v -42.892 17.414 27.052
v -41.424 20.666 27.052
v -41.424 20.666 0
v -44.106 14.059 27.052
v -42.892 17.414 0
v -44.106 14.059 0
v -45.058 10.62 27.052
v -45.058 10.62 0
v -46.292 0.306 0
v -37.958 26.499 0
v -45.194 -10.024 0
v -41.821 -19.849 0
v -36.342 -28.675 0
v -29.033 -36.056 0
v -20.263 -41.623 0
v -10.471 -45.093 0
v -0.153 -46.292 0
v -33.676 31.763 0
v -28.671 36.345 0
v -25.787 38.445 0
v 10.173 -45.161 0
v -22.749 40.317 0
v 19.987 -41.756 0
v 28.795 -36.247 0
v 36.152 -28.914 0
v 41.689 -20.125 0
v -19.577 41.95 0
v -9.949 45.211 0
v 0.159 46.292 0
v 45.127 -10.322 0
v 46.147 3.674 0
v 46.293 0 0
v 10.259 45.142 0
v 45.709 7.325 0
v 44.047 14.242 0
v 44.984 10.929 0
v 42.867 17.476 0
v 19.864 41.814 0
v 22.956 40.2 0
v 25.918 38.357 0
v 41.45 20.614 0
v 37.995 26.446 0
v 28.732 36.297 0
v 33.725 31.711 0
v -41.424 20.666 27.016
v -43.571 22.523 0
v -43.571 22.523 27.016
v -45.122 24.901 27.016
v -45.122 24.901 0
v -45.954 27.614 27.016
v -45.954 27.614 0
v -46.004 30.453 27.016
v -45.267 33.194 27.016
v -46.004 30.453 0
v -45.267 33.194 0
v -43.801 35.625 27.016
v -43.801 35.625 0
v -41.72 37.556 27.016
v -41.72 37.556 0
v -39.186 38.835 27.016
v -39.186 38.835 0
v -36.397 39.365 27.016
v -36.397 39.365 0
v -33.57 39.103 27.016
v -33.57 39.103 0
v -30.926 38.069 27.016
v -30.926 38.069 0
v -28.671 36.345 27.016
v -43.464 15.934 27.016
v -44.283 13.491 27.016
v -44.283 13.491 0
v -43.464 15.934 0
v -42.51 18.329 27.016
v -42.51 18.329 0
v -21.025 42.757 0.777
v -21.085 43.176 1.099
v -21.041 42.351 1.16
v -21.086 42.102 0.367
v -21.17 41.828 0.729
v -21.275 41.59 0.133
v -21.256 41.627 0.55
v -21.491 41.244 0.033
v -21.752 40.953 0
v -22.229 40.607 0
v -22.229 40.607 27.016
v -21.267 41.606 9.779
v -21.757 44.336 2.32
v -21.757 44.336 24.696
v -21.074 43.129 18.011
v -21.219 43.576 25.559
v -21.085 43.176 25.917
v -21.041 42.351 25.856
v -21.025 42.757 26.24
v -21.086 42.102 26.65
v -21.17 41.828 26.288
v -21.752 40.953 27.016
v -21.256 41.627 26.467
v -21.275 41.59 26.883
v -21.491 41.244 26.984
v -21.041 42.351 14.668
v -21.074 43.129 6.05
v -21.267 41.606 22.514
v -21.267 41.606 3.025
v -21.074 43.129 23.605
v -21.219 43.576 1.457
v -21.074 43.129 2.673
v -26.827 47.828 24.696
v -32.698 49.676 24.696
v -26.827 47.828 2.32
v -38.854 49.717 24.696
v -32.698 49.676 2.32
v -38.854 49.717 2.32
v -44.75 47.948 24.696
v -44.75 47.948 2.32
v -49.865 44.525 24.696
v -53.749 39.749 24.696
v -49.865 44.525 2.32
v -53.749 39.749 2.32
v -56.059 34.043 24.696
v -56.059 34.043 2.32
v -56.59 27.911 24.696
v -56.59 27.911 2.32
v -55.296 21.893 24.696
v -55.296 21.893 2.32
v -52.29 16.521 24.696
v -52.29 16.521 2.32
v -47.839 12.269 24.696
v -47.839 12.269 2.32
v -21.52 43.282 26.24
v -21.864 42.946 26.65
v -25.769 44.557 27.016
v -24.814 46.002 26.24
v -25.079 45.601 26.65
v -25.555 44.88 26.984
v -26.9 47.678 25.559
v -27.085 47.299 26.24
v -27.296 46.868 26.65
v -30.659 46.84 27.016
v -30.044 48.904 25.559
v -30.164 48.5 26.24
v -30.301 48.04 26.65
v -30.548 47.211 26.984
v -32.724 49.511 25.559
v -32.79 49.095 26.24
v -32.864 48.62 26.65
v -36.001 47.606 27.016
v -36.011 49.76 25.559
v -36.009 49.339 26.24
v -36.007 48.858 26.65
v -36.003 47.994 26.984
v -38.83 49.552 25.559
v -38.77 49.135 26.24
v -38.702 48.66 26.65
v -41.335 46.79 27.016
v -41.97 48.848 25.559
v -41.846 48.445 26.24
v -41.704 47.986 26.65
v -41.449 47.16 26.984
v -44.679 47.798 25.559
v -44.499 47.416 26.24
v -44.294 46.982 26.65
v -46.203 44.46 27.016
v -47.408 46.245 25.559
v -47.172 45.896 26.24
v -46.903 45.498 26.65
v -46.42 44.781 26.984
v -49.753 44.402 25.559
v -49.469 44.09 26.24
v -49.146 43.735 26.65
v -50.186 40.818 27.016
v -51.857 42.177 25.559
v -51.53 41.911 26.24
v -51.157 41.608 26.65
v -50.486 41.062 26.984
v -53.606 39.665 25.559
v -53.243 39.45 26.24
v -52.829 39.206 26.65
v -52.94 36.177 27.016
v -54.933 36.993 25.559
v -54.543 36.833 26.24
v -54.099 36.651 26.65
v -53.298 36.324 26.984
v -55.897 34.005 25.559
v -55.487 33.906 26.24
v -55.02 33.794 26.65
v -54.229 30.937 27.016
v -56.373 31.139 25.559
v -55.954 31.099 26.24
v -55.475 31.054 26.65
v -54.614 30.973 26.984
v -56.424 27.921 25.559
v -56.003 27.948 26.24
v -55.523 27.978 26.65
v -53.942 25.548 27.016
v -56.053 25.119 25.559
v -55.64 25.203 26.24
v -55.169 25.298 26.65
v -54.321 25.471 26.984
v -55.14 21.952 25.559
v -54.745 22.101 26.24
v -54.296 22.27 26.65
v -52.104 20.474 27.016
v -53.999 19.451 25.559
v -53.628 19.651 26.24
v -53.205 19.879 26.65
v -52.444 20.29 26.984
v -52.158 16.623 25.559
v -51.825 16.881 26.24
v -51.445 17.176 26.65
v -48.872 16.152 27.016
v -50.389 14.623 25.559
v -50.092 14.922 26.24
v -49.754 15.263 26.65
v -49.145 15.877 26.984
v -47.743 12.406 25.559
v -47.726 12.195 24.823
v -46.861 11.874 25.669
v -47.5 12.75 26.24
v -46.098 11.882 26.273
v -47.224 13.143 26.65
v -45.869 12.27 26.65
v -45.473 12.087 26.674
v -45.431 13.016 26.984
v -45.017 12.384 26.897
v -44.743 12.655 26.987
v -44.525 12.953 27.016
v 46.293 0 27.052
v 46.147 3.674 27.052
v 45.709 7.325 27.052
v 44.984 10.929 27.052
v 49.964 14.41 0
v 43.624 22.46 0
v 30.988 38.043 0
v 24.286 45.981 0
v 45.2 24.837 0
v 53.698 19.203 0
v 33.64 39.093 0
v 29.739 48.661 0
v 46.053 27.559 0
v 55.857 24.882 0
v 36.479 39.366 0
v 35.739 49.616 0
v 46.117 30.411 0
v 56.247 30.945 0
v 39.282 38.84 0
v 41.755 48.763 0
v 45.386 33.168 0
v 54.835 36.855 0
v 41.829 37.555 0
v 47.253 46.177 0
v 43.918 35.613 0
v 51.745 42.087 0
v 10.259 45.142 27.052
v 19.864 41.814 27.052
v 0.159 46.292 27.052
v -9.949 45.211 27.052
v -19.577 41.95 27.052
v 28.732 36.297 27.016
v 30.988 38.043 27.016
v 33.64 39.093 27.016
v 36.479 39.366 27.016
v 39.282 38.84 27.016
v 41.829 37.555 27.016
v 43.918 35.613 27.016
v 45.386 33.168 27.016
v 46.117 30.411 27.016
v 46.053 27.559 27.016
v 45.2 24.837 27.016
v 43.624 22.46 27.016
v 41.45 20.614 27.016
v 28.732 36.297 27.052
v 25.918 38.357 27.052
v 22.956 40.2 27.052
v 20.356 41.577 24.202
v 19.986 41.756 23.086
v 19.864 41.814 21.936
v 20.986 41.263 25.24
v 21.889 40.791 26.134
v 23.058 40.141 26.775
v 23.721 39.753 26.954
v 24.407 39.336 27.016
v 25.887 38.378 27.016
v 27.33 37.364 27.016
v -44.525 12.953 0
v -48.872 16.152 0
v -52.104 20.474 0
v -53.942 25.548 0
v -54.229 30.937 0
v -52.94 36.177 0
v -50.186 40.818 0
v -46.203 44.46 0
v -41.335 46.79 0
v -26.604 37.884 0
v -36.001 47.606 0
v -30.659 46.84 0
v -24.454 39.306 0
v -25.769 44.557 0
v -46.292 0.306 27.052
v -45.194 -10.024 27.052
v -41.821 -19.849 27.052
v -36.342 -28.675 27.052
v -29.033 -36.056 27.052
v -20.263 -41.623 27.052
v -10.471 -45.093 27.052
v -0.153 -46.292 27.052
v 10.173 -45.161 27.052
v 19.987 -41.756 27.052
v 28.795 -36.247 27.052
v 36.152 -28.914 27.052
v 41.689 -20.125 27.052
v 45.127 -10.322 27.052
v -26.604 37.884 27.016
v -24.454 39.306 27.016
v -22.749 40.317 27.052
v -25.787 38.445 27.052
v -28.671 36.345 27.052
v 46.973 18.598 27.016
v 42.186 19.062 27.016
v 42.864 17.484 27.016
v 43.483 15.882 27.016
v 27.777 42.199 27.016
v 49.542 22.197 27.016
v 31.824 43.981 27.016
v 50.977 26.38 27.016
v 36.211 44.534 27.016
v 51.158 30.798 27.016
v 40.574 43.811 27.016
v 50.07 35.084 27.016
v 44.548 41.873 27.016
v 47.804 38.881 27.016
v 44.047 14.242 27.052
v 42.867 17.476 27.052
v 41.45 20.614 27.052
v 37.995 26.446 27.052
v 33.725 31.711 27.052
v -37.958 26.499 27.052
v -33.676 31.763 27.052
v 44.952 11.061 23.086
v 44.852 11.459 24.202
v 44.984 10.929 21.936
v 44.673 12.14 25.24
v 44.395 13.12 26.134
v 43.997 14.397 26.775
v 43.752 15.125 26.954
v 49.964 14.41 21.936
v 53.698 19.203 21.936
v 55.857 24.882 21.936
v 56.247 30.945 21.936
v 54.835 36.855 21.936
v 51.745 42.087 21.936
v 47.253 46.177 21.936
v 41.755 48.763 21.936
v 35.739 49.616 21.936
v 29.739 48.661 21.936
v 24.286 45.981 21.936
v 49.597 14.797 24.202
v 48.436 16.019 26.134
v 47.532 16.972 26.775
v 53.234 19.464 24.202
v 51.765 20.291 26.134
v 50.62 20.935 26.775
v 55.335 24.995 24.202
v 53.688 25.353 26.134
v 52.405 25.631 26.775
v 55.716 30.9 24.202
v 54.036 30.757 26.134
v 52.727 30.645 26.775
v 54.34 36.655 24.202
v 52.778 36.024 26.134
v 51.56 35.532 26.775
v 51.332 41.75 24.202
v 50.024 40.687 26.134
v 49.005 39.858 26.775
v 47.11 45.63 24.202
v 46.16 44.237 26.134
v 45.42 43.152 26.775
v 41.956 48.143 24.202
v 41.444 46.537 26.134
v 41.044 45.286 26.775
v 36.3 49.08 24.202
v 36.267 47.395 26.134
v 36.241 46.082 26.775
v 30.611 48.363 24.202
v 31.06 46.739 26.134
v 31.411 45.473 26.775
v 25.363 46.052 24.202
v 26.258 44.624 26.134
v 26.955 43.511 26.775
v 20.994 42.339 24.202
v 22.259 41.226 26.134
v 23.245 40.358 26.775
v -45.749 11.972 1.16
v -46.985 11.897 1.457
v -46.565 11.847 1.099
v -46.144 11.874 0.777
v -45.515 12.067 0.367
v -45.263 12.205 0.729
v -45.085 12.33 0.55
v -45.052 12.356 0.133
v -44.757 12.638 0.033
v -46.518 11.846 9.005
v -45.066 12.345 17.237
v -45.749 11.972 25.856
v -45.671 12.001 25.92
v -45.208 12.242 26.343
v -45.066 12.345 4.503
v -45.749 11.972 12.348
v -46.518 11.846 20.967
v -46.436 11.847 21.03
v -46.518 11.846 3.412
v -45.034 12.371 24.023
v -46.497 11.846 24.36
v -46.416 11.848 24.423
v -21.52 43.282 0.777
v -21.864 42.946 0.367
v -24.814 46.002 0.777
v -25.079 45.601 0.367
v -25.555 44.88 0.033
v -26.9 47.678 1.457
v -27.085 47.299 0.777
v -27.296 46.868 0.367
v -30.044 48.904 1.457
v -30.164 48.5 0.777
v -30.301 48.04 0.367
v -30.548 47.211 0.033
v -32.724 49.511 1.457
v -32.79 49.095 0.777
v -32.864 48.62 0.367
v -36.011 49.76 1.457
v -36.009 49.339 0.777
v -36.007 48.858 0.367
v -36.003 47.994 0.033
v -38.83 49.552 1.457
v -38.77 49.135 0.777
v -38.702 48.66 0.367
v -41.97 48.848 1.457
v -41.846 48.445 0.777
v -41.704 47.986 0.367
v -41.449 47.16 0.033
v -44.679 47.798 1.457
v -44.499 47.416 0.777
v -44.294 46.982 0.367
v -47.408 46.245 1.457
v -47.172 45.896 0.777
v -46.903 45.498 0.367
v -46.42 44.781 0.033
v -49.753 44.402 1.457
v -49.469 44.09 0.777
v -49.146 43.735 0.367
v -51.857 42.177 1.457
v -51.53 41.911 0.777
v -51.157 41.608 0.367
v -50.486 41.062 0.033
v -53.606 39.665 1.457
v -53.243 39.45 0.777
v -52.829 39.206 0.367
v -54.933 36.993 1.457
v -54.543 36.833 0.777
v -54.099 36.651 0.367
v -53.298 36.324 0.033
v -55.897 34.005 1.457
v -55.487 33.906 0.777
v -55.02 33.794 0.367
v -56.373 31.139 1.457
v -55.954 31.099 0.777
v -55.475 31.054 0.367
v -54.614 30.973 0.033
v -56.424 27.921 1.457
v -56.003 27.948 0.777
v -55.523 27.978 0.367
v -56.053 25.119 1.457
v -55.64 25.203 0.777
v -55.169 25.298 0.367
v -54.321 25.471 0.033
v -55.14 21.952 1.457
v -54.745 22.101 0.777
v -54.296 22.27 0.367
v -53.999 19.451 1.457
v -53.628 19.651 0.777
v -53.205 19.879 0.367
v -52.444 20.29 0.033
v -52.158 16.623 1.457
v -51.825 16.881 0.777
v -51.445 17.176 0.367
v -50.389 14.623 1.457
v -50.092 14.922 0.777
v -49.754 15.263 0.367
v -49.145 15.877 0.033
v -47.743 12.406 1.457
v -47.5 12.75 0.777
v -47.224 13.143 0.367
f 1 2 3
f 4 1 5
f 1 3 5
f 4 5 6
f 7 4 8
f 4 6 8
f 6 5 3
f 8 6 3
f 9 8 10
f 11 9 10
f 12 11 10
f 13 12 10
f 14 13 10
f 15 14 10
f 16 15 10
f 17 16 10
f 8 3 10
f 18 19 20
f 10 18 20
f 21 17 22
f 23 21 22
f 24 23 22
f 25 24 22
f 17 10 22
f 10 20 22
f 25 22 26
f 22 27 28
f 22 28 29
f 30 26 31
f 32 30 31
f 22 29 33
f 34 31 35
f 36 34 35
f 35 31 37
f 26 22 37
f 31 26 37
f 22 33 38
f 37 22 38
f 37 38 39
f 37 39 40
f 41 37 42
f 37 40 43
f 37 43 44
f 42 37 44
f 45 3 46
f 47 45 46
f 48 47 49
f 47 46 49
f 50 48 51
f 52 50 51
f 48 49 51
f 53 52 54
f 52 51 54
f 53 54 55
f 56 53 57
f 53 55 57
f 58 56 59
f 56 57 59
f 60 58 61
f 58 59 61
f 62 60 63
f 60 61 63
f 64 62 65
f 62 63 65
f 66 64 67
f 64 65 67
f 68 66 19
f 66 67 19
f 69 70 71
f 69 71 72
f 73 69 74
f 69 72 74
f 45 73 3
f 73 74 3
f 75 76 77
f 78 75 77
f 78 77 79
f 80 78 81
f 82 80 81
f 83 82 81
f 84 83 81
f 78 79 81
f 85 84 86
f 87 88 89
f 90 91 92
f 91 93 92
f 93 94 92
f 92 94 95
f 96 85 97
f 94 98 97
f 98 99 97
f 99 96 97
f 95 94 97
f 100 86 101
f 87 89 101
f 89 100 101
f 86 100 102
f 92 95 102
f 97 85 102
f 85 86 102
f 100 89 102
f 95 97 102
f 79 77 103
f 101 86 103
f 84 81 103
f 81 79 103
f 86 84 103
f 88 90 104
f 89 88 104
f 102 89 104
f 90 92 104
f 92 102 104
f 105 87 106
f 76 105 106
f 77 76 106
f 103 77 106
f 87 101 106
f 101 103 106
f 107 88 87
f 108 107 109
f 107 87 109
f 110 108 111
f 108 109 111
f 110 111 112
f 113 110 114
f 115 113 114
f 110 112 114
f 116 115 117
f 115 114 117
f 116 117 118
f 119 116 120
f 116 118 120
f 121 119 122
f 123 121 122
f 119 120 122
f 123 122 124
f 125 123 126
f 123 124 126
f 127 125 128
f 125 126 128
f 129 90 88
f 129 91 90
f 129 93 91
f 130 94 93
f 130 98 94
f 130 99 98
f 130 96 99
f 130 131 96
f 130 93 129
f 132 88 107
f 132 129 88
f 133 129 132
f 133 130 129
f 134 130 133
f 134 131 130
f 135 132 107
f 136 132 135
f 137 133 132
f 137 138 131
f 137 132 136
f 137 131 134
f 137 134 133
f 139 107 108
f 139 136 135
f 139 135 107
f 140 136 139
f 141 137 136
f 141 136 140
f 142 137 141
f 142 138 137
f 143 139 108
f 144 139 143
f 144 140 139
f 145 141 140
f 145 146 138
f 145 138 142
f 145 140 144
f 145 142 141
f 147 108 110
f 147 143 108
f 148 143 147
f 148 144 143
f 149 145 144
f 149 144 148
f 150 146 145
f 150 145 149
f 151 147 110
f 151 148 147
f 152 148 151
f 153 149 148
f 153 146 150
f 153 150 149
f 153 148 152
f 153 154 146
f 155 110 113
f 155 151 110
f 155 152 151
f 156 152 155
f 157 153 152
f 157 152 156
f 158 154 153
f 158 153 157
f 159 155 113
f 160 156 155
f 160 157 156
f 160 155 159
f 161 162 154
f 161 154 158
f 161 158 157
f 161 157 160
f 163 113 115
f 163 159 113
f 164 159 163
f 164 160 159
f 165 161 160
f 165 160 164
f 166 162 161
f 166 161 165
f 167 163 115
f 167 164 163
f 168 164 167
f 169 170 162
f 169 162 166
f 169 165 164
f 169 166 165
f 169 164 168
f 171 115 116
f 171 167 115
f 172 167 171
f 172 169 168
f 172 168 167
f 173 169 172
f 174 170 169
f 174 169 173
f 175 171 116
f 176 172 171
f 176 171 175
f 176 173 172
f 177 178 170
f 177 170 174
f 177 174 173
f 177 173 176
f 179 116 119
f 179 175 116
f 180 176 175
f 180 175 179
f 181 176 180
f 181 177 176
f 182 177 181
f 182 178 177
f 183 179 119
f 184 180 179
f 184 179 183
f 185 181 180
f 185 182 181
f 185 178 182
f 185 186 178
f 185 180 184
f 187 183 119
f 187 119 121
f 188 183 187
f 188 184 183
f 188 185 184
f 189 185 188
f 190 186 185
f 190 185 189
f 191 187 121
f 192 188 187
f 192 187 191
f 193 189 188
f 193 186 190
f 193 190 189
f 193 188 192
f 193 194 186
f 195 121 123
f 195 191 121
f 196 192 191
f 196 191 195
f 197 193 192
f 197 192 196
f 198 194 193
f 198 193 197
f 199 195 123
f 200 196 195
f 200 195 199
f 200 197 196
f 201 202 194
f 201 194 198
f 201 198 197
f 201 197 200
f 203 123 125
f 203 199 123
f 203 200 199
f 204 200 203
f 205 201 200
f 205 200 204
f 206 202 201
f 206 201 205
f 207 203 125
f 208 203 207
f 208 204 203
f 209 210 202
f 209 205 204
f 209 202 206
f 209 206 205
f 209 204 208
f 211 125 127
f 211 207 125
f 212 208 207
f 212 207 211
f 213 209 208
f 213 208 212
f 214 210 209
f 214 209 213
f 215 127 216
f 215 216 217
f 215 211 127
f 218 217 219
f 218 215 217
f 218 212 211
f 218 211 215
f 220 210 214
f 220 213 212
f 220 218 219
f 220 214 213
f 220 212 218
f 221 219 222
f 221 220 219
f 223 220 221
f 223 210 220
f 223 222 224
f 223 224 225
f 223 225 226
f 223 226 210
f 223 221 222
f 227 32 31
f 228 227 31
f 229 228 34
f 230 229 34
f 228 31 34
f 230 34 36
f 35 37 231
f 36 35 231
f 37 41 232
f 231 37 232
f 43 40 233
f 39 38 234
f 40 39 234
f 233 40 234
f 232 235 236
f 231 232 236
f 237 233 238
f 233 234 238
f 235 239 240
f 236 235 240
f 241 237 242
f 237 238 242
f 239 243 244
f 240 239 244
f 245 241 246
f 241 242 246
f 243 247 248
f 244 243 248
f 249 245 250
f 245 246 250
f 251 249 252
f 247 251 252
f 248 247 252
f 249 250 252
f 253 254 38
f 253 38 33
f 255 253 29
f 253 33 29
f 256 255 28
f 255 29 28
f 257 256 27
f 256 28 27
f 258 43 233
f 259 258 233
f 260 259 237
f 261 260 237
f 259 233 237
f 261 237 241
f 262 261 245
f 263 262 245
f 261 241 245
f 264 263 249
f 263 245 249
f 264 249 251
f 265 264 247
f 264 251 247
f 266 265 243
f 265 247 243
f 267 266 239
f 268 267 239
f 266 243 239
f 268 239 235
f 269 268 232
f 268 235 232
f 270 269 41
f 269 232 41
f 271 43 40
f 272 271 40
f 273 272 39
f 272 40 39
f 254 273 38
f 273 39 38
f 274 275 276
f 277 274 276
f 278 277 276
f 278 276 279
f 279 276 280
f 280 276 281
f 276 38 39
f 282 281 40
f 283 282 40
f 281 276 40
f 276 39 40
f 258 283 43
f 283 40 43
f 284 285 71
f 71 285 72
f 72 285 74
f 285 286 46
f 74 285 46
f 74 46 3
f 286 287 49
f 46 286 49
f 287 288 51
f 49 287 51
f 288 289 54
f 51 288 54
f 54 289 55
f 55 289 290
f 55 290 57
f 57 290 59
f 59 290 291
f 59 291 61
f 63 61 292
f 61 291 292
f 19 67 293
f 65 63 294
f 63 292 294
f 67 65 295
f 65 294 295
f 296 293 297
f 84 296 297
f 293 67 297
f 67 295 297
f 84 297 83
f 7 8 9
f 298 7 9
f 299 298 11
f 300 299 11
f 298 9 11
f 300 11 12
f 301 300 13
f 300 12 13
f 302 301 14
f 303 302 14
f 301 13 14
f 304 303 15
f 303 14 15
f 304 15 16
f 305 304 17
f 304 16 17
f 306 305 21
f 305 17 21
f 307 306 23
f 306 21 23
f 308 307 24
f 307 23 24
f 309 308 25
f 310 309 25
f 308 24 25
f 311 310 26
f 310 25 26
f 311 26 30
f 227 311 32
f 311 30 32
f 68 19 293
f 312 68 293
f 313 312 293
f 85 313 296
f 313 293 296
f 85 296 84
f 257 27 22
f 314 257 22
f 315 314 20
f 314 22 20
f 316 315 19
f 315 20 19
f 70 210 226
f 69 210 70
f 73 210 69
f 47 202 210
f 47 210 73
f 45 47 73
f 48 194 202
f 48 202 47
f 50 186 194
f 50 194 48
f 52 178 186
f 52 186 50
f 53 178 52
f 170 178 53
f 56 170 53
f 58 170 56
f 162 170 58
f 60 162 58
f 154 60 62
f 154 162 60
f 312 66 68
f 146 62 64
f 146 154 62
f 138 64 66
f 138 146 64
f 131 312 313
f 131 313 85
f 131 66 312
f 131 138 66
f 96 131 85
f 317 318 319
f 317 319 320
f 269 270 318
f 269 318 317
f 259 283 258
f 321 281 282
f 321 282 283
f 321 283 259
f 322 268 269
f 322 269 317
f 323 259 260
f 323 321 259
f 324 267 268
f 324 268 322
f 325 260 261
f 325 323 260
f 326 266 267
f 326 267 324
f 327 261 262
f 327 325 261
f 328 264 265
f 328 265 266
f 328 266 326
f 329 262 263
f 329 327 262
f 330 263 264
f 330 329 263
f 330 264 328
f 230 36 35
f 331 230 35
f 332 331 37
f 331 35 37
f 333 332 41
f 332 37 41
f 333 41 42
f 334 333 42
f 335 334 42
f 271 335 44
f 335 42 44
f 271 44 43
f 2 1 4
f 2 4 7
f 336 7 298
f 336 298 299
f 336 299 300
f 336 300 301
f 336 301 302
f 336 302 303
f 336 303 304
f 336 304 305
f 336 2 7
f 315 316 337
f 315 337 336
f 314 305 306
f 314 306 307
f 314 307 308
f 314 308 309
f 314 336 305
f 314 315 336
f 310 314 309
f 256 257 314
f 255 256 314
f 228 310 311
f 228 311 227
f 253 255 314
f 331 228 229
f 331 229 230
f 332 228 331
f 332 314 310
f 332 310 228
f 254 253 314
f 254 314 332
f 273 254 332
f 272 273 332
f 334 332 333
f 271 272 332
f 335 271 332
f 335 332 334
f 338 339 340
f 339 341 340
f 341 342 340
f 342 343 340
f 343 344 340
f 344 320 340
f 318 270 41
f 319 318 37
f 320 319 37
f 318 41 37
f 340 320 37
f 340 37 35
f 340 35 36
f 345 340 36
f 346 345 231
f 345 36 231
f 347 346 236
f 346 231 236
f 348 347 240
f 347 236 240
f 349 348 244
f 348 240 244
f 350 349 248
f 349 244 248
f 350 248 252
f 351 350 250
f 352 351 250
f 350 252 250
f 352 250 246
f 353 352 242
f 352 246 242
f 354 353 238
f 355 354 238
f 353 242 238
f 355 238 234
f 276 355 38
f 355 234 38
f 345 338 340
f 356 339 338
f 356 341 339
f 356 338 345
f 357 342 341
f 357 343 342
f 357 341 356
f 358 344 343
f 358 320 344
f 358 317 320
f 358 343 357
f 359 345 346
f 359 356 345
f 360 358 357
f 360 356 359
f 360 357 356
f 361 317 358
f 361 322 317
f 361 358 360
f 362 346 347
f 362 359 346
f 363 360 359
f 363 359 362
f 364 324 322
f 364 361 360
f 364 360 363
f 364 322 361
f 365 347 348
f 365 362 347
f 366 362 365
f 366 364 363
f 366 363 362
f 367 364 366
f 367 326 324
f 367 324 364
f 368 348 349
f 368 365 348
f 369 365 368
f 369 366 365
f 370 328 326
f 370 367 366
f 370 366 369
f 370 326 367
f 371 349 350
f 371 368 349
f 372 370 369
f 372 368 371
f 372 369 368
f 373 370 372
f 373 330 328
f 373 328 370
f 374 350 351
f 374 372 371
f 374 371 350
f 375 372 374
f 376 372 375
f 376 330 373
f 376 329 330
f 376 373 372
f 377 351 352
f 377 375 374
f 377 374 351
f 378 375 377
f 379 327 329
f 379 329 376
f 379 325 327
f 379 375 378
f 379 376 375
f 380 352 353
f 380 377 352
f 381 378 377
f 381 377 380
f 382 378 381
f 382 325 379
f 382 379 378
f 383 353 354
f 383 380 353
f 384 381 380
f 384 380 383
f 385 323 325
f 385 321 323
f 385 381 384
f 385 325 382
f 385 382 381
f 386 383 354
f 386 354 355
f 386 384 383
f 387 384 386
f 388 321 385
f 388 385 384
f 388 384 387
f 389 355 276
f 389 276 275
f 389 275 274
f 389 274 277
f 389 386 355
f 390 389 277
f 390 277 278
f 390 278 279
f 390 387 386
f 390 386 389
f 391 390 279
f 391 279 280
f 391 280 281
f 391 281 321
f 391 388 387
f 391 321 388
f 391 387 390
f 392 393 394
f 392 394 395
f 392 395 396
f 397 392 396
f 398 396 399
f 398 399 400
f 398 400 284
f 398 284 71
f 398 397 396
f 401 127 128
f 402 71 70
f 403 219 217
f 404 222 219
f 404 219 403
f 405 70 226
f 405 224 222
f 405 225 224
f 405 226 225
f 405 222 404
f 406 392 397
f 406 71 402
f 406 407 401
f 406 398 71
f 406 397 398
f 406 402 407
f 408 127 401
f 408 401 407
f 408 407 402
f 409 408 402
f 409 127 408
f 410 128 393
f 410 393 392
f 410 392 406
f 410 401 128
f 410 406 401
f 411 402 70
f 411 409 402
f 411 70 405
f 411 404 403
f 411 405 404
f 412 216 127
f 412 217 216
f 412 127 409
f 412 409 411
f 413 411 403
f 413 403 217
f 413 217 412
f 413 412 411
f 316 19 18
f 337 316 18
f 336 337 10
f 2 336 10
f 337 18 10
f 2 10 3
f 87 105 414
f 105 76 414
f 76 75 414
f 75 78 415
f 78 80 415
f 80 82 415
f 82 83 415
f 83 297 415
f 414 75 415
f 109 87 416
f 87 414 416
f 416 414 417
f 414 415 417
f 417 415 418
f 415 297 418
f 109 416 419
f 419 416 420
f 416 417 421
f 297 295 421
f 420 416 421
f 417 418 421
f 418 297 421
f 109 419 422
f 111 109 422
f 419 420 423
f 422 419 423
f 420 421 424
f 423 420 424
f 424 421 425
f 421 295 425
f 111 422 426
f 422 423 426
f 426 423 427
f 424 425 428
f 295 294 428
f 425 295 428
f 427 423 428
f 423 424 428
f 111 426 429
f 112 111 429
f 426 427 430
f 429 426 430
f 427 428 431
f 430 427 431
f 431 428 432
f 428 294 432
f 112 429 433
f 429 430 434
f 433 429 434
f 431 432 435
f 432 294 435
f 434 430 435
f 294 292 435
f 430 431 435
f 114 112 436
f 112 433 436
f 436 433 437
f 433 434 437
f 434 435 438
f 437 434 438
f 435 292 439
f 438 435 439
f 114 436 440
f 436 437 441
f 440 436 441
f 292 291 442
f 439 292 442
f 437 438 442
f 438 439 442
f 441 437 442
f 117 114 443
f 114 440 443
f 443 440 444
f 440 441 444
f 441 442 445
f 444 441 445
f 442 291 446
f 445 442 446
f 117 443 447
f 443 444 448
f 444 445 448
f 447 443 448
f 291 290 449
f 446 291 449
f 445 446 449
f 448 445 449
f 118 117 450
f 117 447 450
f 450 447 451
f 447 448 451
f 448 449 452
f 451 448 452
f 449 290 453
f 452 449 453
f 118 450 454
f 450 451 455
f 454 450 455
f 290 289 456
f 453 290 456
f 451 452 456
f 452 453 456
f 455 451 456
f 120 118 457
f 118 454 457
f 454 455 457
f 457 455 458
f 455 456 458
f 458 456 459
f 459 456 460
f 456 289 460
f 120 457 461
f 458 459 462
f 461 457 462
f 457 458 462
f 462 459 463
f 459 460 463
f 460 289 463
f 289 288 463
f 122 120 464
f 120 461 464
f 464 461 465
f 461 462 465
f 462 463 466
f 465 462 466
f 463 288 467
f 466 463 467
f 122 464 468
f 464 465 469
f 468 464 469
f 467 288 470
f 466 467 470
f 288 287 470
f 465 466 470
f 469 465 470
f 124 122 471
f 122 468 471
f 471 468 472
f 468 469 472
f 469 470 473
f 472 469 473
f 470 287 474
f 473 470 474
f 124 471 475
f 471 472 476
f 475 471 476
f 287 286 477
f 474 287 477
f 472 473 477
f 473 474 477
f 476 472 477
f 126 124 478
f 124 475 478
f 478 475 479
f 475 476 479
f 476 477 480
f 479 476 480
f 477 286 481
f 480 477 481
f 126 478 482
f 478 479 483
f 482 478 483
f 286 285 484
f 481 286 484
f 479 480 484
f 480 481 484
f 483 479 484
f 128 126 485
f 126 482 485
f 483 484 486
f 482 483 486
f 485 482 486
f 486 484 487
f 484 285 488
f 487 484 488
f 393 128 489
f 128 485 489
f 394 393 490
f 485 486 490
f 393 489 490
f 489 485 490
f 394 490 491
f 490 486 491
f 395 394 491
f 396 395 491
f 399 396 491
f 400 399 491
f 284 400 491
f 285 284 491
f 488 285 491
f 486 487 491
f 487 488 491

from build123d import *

# Parameters (mm, degrees)
F1_DEPTH = 27.01636
F2_DEPTH = 27.05208
F3_R     = 2.320423
F4_R     = 5.08


with BuildPart() as f1:
    # F0 (on Top) → F1 (new body)
    with BuildSketch(Plane.XY):
        with BuildLine():
            ThreePointArc((-19.576549, 41.949611), (-51.985797, 42.282172), (-45.057971, 10.620283))
            ThreePointArc((-45.057971, 10.620283), (-43.53158, 15.74842), (-41.423667, 20.666179))
            ThreePointArc((-41.423667, 20.666179), (-43.800719, 35.624914), (-28.671424, 36.345022))
            ThreePointArc((-28.671424, 36.345022), (-24.286201, 39.410551), (-19.576549, 41.949611))
        make_face()
        with BuildLine():
            ThreePointArc((41.449769, 20.613777), (43.48729, 15.870309), (44.983974, 10.929468))
            ThreePointArc((44.983974, 10.929468), (51.745319, 42.086581), (19.864175, 41.81418))
            ThreePointArc((19.864175, 41.81418), (24.454412, 39.306397), (28.732447, 36.296799))
            ThreePointArc((28.732447, 36.296799), (43.918373, 35.613294), (41.449769, 20.613777))
        make_face()
    extrude(amount=F1_DEPTH)

    # F3
    f3_edges = [f1.edges().sort_by_distance(p)[0] for p in [
        (-19.576549, 41.949611, 13.50818),
        (-45.057971, 10.620283, 13.50818),
        (-51.985797, 42.282172, 0),
        (-51.985797, 42.282172, 27.01636),
    ]]
    fillet(f3_edges, radius=F3_R)

    # F4
    f4_edges = [f1.edges().sort_by_distance(p)[0] for p in [
        (-21.757461, 44.336159, 13.50818),
        (-51.985797, 42.282172, 2.320423),
        (-51.985797, 42.282172, 24.695937),
        (-47.838757, 12.269288, 13.50818),
        (51.745319, 42.086581, 27.01636),
    ]]
    fillet(f4_edges, radius=F4_R)


with BuildPart() as f2:
    # F0 (on Top) → F2 (new body)
    with BuildSketch(Plane.XY):
        with BuildLine():
            ThreePointArc((-45.057971, 10.620283), (-5.345907, -45.982958), (46.292668, 0))
            ThreePointArc((46.292668, 0), (45.96433, 5.50377), (44.983974, 10.929468))
            ThreePointArc((44.983974, 10.929468), (43.48729, 15.870309), (41.449769, 20.613777))
            ThreePointArc((41.449769, 20.613777), (35.956573, 29.157092), (28.732447, 36.296799))
            ThreePointArc((28.732447, 36.296799), (24.454412, 39.306397), (19.864175, 41.81418))
            ThreePointArc((19.864175, 41.81418), (0.158958, 46.292395), (-19.576549, 41.949611))
            ThreePointArc((-19.576549, 41.949611), (-24.286201, 39.410551), (-28.671424, 36.345022))
            ThreePointArc((-28.671424, 36.345022), (-35.913604, 29.210001), (-41.423667, 20.666179))
            ThreePointArc((-41.423667, 20.666179), (-43.53158, 15.74842), (-45.057971, 10.620283))
        make_face()
    extrude(amount=F2_DEPTH)


solid = Compound([f1.part, f2.part])
